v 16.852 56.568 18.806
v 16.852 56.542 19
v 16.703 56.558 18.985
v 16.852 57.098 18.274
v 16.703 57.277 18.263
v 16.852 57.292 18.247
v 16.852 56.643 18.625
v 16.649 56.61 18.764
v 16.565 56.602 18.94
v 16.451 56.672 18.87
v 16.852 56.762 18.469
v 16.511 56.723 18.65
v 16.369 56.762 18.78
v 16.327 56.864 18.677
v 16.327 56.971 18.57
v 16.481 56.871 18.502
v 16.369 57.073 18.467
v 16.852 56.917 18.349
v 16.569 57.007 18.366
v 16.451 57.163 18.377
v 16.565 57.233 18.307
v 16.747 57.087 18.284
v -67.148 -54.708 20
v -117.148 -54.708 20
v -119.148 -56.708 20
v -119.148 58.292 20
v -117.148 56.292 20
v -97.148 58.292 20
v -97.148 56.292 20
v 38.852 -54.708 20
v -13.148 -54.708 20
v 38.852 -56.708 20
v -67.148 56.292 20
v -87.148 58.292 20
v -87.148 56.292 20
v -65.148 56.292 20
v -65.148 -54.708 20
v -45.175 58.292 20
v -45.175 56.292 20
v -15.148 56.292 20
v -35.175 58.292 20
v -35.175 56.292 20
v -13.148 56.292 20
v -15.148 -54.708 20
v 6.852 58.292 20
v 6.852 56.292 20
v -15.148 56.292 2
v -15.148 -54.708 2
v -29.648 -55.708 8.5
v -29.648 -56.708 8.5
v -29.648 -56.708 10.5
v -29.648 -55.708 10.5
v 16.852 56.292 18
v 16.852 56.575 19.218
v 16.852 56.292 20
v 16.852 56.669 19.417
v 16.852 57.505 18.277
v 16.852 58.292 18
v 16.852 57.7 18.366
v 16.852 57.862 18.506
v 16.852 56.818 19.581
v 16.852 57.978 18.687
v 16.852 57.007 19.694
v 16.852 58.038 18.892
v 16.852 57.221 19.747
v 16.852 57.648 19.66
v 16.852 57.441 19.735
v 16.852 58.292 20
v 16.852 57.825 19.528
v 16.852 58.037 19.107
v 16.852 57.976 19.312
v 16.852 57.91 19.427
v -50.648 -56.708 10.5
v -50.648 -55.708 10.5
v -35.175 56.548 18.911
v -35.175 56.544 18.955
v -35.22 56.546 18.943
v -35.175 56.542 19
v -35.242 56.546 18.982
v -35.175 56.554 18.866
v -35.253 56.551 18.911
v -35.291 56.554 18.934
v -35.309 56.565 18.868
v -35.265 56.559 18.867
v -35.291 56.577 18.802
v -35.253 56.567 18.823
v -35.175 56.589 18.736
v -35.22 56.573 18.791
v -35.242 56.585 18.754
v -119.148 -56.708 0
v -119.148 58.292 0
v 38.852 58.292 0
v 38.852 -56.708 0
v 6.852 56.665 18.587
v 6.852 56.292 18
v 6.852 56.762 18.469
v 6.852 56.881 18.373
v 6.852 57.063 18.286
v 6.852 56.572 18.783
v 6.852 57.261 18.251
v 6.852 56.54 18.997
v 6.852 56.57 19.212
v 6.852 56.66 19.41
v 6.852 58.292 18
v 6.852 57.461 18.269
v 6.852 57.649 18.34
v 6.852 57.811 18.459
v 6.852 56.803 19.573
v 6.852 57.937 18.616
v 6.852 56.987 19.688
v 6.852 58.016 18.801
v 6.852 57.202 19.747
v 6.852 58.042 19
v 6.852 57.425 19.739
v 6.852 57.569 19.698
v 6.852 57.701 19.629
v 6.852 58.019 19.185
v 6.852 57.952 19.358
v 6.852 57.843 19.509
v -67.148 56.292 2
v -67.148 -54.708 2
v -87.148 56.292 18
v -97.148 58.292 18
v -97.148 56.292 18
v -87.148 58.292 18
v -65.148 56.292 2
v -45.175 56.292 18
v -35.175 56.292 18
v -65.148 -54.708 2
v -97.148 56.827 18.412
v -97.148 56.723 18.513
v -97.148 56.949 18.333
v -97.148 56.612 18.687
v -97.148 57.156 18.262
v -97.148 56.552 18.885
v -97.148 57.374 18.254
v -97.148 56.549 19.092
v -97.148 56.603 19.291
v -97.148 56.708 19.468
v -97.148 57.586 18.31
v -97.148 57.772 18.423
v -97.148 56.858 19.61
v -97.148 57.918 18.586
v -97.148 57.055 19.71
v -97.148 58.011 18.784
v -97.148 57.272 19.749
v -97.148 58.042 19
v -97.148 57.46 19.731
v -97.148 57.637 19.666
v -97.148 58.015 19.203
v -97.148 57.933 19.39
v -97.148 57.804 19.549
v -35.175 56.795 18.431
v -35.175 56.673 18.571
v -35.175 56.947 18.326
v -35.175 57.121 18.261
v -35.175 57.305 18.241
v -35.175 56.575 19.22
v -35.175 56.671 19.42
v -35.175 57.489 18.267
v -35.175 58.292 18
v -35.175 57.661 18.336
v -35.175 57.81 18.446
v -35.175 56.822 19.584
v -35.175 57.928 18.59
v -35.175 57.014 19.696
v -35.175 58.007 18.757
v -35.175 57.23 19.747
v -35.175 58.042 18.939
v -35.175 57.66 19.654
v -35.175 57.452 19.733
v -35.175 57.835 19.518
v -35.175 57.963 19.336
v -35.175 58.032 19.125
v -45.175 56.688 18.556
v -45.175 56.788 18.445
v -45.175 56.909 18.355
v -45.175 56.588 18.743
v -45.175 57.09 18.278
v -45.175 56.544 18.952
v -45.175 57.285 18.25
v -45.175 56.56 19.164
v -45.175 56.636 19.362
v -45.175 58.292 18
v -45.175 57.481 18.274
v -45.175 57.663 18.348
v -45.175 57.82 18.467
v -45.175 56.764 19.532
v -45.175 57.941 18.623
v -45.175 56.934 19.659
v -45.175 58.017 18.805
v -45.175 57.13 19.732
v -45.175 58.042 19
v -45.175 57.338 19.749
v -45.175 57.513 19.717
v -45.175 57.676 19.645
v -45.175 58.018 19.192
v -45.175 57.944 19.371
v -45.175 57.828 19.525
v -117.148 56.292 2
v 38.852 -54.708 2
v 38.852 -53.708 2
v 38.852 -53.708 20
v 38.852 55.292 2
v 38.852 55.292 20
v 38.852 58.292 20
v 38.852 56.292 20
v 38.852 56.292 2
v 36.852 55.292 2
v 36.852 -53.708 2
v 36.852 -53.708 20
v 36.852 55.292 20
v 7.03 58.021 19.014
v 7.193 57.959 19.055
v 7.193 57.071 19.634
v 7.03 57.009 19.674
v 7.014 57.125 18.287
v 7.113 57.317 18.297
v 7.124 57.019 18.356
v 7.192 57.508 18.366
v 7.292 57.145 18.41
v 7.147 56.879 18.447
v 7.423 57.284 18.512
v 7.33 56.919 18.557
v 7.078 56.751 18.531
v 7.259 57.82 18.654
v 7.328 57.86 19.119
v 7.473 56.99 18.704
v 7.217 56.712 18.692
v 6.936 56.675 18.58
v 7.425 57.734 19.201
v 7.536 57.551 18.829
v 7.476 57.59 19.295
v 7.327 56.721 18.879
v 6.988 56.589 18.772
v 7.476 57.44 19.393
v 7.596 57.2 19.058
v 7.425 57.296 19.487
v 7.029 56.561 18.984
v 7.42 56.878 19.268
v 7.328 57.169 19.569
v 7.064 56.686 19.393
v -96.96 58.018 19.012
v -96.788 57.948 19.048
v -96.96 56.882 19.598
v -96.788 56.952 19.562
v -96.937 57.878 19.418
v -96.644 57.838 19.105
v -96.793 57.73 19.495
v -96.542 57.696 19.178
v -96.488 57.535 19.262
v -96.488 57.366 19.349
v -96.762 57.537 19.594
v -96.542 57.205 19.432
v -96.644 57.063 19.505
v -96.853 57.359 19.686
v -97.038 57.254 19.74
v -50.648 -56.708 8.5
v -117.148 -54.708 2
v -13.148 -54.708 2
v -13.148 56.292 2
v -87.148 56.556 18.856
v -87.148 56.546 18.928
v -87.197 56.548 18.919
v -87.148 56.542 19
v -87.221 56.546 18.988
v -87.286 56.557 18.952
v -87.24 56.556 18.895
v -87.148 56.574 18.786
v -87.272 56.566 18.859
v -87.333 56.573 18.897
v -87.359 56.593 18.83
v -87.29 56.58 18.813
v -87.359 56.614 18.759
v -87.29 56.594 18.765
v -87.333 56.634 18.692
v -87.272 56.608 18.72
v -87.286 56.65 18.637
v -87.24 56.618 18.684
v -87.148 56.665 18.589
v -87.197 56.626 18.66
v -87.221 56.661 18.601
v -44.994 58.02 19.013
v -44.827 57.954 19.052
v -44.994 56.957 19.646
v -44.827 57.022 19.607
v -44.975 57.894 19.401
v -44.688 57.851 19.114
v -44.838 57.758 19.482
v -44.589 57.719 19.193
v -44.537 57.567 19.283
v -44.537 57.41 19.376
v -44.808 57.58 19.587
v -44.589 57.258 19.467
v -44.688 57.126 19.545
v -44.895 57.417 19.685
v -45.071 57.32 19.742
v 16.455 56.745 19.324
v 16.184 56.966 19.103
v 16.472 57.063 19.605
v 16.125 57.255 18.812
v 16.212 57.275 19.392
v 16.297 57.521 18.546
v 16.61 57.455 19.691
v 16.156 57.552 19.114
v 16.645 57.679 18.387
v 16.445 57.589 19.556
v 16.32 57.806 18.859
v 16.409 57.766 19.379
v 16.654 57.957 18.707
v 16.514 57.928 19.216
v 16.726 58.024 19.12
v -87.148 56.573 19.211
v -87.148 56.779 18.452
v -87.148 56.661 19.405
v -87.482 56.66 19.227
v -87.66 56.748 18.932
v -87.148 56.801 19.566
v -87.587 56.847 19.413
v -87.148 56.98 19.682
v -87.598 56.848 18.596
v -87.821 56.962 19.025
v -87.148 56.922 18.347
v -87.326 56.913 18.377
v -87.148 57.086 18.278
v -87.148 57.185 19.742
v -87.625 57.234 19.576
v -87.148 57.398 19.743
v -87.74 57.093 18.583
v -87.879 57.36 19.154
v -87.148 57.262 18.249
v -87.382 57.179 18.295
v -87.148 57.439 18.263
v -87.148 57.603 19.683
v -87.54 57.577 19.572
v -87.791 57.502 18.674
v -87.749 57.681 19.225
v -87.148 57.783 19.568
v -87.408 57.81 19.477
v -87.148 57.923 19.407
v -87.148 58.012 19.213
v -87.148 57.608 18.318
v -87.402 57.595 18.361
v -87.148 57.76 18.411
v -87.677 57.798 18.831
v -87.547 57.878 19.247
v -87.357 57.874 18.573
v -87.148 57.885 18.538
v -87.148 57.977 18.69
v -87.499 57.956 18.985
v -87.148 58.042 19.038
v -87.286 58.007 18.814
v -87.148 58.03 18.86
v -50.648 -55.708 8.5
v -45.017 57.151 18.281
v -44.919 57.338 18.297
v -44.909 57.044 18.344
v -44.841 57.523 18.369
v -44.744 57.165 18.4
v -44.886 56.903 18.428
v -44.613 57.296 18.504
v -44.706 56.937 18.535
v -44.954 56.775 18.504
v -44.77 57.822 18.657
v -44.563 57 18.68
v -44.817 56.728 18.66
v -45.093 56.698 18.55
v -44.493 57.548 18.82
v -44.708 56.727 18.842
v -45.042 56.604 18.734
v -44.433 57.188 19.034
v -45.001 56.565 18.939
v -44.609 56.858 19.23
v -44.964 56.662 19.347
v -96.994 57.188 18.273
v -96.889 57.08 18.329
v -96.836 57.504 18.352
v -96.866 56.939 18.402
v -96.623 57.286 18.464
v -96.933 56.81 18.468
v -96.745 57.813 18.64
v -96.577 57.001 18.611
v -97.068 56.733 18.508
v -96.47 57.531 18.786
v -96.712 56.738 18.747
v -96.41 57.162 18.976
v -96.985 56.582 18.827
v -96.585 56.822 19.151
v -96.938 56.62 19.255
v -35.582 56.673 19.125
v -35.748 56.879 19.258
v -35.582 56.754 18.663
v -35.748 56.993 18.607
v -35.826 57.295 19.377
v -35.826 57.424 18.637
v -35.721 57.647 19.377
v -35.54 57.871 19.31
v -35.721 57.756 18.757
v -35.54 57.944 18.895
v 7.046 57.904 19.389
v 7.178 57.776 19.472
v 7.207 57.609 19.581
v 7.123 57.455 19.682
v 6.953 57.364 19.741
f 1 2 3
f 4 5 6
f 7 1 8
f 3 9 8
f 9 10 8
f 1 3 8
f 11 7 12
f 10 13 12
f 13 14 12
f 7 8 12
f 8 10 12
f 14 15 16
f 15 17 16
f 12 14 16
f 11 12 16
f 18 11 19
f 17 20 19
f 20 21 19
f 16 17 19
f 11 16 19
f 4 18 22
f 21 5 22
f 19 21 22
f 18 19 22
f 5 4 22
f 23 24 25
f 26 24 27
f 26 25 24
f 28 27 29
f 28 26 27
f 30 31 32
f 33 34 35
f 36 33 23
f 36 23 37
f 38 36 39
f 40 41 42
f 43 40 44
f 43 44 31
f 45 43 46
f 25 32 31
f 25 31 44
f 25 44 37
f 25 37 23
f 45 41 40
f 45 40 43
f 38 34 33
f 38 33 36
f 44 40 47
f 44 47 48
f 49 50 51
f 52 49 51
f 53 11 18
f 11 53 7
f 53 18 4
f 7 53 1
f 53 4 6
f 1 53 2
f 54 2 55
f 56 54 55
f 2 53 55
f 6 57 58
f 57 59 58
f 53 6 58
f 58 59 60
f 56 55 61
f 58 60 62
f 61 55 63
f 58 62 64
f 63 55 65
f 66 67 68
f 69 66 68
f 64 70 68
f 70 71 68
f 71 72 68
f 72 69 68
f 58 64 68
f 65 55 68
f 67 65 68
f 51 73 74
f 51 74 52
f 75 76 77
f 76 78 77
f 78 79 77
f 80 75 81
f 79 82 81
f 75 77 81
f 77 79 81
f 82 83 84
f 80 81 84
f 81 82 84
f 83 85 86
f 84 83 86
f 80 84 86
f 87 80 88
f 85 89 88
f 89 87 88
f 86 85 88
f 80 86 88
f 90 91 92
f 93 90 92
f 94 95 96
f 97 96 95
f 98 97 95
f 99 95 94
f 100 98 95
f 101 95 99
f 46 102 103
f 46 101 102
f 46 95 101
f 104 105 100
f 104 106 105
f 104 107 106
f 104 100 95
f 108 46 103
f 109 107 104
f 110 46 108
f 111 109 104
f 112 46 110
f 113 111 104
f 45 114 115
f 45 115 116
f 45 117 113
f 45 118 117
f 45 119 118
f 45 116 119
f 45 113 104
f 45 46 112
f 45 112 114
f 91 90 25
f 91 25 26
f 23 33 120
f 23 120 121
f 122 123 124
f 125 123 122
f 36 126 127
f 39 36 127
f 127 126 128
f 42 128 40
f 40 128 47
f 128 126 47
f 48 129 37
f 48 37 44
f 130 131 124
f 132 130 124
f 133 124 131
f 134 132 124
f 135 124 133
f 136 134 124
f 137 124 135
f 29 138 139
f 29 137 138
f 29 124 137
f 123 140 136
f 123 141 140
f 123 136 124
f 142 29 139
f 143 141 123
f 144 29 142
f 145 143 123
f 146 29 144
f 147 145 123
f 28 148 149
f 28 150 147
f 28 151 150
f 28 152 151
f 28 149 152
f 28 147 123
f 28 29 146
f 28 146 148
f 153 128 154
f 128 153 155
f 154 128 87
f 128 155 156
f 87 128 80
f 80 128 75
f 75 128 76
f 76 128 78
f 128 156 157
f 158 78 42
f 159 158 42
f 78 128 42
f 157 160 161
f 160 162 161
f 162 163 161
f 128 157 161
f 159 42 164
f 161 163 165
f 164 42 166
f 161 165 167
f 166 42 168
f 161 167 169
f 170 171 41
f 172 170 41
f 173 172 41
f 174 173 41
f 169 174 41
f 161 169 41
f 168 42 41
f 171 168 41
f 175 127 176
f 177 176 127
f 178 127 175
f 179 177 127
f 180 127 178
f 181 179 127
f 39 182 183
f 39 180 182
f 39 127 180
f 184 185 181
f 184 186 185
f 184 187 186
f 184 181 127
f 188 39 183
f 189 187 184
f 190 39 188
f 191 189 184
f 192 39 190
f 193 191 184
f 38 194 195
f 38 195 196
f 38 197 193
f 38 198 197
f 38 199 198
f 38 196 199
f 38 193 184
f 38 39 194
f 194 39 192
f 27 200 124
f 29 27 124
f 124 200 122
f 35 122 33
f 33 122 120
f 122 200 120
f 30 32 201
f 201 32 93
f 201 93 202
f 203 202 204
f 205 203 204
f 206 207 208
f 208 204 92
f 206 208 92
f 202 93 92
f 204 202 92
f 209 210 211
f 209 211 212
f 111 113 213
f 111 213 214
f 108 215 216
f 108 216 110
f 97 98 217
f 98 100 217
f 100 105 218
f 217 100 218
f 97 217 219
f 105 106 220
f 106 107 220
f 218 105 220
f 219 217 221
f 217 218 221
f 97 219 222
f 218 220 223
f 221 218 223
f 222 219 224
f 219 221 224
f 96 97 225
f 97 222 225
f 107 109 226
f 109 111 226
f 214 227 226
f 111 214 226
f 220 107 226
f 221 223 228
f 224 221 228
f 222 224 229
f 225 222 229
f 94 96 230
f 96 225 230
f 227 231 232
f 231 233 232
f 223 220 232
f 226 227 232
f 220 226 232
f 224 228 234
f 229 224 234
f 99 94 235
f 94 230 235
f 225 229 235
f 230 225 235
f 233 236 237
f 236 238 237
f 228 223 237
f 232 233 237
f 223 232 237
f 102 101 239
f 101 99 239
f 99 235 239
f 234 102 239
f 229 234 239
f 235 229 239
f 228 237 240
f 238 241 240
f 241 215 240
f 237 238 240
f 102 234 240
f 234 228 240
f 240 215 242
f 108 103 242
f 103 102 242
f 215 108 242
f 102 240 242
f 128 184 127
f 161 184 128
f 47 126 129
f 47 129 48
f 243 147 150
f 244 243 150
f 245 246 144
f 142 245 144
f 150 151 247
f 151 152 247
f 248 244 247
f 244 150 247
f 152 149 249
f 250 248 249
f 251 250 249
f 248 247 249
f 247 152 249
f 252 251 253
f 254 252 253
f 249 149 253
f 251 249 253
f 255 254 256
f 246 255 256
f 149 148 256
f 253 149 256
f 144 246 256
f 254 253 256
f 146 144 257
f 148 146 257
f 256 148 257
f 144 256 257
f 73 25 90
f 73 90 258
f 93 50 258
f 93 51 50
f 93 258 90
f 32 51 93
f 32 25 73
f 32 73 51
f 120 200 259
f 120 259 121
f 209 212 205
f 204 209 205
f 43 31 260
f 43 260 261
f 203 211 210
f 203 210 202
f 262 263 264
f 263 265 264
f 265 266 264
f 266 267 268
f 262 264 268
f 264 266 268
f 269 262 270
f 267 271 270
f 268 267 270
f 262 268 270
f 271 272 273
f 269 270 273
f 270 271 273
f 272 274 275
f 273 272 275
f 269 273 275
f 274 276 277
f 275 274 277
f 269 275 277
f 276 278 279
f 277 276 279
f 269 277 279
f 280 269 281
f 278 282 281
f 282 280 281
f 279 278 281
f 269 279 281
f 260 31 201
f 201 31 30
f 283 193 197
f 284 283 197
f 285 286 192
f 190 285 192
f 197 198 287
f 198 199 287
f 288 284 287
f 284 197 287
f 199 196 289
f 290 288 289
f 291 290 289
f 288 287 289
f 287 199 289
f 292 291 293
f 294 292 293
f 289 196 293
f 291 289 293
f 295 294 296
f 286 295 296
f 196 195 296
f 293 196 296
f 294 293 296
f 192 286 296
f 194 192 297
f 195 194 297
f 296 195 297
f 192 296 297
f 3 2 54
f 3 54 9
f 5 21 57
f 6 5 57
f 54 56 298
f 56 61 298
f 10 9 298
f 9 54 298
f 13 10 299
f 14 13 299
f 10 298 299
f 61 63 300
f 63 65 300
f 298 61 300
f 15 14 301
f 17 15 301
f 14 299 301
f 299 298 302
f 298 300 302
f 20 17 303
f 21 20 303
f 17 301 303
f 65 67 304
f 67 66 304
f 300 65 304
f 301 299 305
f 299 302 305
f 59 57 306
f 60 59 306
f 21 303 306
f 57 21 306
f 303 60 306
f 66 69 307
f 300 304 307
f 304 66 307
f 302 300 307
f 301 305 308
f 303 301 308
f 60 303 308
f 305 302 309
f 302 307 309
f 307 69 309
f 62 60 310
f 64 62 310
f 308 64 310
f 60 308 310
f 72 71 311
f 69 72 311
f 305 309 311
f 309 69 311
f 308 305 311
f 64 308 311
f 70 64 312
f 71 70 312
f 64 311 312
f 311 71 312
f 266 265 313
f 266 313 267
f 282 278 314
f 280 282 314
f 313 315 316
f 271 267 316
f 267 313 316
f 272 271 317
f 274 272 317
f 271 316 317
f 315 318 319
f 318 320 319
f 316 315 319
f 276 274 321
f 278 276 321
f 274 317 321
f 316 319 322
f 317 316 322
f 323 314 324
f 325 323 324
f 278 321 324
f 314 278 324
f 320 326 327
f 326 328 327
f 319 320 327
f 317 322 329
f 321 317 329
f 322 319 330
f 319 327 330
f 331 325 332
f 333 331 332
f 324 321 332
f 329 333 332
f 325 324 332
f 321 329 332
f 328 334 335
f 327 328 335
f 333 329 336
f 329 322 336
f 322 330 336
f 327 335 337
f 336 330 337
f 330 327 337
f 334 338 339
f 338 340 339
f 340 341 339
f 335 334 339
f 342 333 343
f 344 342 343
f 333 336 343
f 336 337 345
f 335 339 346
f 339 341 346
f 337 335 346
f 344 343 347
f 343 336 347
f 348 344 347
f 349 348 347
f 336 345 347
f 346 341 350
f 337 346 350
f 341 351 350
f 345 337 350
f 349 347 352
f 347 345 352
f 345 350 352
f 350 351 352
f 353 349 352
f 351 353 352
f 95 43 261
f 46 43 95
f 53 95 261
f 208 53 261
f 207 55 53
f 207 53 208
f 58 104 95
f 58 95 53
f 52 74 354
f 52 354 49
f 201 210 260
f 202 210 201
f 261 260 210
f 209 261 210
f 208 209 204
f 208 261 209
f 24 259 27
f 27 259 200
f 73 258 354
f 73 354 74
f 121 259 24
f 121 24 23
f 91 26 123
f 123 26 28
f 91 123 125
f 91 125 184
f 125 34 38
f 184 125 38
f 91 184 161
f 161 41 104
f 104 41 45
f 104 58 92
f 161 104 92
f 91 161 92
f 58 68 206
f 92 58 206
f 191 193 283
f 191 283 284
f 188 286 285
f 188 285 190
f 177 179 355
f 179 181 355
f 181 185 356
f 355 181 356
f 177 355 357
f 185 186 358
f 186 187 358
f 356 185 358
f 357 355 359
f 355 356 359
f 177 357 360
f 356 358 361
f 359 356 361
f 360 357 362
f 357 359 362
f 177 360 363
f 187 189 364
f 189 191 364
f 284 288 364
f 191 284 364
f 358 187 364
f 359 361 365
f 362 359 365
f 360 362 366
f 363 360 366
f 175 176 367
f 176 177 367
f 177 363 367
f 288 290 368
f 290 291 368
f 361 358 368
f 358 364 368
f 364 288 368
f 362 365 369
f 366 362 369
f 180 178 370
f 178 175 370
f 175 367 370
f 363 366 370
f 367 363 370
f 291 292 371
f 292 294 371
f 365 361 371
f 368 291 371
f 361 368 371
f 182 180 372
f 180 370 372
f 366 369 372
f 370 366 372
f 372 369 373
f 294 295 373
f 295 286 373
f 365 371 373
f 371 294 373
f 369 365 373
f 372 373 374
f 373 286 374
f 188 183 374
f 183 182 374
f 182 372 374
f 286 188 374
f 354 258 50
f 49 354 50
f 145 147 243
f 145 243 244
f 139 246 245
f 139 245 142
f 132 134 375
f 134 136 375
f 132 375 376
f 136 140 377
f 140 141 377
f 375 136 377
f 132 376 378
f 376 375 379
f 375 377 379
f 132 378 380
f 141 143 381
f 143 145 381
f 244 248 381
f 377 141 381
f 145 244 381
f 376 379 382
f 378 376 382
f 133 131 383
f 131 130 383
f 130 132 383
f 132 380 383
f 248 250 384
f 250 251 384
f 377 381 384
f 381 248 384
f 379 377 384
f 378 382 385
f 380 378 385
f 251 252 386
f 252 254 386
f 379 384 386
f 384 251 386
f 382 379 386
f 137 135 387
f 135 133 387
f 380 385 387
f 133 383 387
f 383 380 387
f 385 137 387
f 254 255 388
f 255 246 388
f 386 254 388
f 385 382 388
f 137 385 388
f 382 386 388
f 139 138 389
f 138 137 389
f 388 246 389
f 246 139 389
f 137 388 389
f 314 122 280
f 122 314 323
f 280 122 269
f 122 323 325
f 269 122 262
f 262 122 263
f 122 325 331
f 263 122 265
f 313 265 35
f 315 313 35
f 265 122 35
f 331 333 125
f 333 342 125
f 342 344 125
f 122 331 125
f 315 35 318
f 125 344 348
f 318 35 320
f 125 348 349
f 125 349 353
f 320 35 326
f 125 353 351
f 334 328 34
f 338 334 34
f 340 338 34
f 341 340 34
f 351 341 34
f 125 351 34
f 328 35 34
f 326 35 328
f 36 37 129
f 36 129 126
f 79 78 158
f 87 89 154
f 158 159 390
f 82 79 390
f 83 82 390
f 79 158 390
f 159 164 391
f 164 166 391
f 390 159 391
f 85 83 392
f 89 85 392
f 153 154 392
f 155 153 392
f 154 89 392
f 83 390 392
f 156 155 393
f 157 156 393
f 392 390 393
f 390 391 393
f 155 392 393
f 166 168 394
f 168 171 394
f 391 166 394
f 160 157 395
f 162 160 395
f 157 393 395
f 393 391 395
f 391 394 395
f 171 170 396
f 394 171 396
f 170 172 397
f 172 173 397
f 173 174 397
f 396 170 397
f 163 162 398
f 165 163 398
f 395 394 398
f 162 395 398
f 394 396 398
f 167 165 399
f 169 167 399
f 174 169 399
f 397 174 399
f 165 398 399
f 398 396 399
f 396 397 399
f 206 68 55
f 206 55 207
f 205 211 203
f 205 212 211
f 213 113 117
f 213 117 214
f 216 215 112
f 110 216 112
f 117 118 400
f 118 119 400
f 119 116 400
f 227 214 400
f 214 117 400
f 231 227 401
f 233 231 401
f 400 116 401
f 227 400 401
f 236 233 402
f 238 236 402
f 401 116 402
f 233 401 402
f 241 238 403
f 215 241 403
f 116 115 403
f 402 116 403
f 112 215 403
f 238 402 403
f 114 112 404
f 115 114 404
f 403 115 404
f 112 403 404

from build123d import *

# Parameters (mm, degrees)
F0_W      = 158
F0_H      = 115
F1_DEPTH  = 20
F2_T      = -2
F3_W      = 2
F3_H      = 2
F3_H_2    = 111
F4_DEPTH  = 20
F5_W      = 2
F5_H      = 1
F6_DEPTH  = 18
F7_W      = 10
F7_H      = 2
F8_DEPTH  = 2
F21_W     = 21
F21_H     = 2
F22_DEPTH = 1


with BuildPart() as f1:
    # F0 (on Top) → F1 (new body)
    with BuildSketch(Plane.XY):
        with Locations((-40.1476950792, 0.7924512029)):
            Rectangle(F0_W, F0_H)
    extrude(amount=F1_DEPTH)

    # F2
    f2_openings = [f1.faces().sort_by_distance(p)[0] for p in [
        (-40.147695, 0.792451, 20),
    ]]
    offset(amount=F2_T, openings=f2_openings)

    # F3 (on face) → F4 (join)
    with BuildSketch(Plane.XY.offset(20)):
        with Locations((-66.1476950792, 57.2924512029)):
            Rectangle(F3_W, F3_H)
        with Locations((-66.1476950792, -55.7075487971)):
            Rectangle(F3_W, F3_H)
        with Locations((-14.1476950792, 57.2924512029)):
            Rectangle(F3_W, F3_H)
        with Locations((-14.1476950792, -55.7075487971)):
            Rectangle(F3_W, F3_H)
        with Locations((-14.1476950792, 0.7924512029)):
            Rectangle(F3_W, F3_H_2)
        with Locations((-66.1476950792, 0.7924512029)):
            Rectangle(F3_W, F3_H_2)
    extrude(amount=-F4_DEPTH)

    # F5 (on face) → F6 (cut)
    with BuildSketch(Plane.XY.offset(20)):
        with Locations((37.8523049208, 55.7924512029)):
            Rectangle(F5_W, F5_H)
        with Locations((37.8523049208, -54.2075487971)):
            Rectangle(F5_W, F5_H)
    extrude(amount=-F6_DEPTH, mode=Mode.SUBTRACT)

    # F7 (on face) → F8 (cut)
    with BuildSketch(Plane.XY.offset(20)):
        with Locations((-92.1476950792, 57.2924512029)):
            Rectangle(F7_W, F7_H)
        with Locations((11.8523049208, 57.2924512029)):
            Rectangle(F7_W, F7_H)
        with Locations((-40.1753512025, 57.2924512029)):
            Rectangle(F7_W, F7_H)
    extrude(amount=-F8_DEPTH, mode=Mode.SUBTRACT)

    # F9 (on face) → F10 (revolve)
    with BuildSketch(Plane.YZ.offset(-97.1476950792)):
        with BuildLine():
            ThreePointArc((56.9494204277, 18.3330443139), (57.6831089294, 18.3597761792), (58.0424512029, 19))
            ThreePointArc((58.0424512029, 19), (57.9330206868, 19.3900906769), (57.6366625729, 19.6663471563))
            Line((57.6366625729, 19.6663471563), (56.9494204277, 18.3330443139))
        make_face()
    revolve(axis=Axis((-97.1476950792, 57.2930415003, 18.9996957351), (0, -0.4581616098, -0.8888689101)))

    # F11 (on face) → F12 (revolve)
    with BuildSketch(Plane(origin=(-87.1476950792, 0, 0), x_dir=(0, -1, 0), z_dir=(-1, 0, 0))):
        with BuildLine():
            ThreePointArc((-56.5737668636, 18.7855406321), (-56.5503214115, 18.8916331565), (-56.5424512029, 19))
            ThreePointArc((-56.5424512029, 19), (-57.1849084822, 19.7422496637), (-58.0116100381, 19.2128627954))
            Line((-58.0116100381, 19.2128627954), (-56.5737668636, 18.7855406321))
        make_face()
    revolve(axis=Axis((-87.1476950792, 57.2926884509, 18.9992017138), (0, -0.9585627073, -0.2848816178)))

    # F13 (on face) → F14 (revolve)
    with BuildSketch(Plane(origin=(-35.1753512025, 0, 0), x_dir=(0, -1, 0), z_dir=(-1, 0, 0))):
        with BuildLine():
            ThreePointArc((-56.5544690905, 18.8662749021), (-56.5454617169, 18.9328679819), (-56.5424512029, 19))
            ThreePointArc((-56.5424512029, 19), (-57.2299686819, 19.7473927579), (-58.0320403617, 19.1245306231))
            Line((-58.0320403617, 19.1245306231), (-56.5544690905, 18.8662749021))
        make_face()
    revolve(axis=Axis((-35.1753512025, 57.2932547261, 18.9954027626), (0, -0.9850665855, -0.172173814)))

    # F15 (on face) → F16 (revolve)
    with BuildSketch(Plane.YZ.offset(-45.1753512025)):
        with BuildLine():
            ThreePointArc((56.9089305888, 18.3554754166), (57.6631664167, 18.3480258976), (58.0424512029, 19))
            ThreePointArc((58.0424512029, 19), (57.9443668734, 19.3708179586), (57.675768647, 19.6446454351))
            Line((57.675768647, 19.6446454351), (56.9089305888, 18.3554754166))
        make_face()
    revolve(axis=Axis((-45.1753512025, 57.2923496179, 19.0000604259), (0, -0.5112253785, -0.8594466897)))

    # F17 (on face) → F18 (revolve)
    with BuildSketch(Plane.YZ.offset(6.8523049208)):
        with BuildLine():
            ThreePointArc((56.8813847049, 18.3726848206), (57.648962161, 18.3401515805), (58.0424512029, 19))
            ThreePointArc((58.0424512029, 19), (57.9515038931, 19.35797982), (57.7007190655, 19.6291401691))
            Line((57.7007190655, 19.6291401691), (56.8813847049, 18.3726848206))
        make_face()
    revolve(axis=Axis((6.8523049208, 57.2910518852, 19.0009124949), (0, -0.546224262, -0.8376389769)))

    # F19 (on face) → F20 (revolve)
    with BuildSketch(Plane(origin=(16.8523049208, 0, 0), x_dir=(0, -1, 0), z_dir=(-1, 0, 0))):
        with BuildLine():
            ThreePointArc((-56.7624630169, 18.4693282345), (-56.5996340771, 18.7127641557), (-56.5424512029, 19))
            ThreePointArc((-56.5424512029, 19), (-57.0069017432, 19.6935138831), (-57.8250152191, 19.5280867056))
            Line((-57.8250152191, 19.5280867056), (-56.7624630169, 18.4693282345))
        make_face()
    revolve(axis=Axis((16.8523049208, 57.293739118, 18.99870747), (0, -0.7083702312, -0.7058410696)))

    # F21 (on face) → F22 (cut)
    with BuildSketch(Plane.XZ.offset(56.7075487971)):
        with Locations((-40.1476950792, 9.5)):
            Rectangle(F21_W, F21_H)
    extrude(amount=-F22_DEPTH, mode=Mode.SUBTRACT)


solid = f1.part
